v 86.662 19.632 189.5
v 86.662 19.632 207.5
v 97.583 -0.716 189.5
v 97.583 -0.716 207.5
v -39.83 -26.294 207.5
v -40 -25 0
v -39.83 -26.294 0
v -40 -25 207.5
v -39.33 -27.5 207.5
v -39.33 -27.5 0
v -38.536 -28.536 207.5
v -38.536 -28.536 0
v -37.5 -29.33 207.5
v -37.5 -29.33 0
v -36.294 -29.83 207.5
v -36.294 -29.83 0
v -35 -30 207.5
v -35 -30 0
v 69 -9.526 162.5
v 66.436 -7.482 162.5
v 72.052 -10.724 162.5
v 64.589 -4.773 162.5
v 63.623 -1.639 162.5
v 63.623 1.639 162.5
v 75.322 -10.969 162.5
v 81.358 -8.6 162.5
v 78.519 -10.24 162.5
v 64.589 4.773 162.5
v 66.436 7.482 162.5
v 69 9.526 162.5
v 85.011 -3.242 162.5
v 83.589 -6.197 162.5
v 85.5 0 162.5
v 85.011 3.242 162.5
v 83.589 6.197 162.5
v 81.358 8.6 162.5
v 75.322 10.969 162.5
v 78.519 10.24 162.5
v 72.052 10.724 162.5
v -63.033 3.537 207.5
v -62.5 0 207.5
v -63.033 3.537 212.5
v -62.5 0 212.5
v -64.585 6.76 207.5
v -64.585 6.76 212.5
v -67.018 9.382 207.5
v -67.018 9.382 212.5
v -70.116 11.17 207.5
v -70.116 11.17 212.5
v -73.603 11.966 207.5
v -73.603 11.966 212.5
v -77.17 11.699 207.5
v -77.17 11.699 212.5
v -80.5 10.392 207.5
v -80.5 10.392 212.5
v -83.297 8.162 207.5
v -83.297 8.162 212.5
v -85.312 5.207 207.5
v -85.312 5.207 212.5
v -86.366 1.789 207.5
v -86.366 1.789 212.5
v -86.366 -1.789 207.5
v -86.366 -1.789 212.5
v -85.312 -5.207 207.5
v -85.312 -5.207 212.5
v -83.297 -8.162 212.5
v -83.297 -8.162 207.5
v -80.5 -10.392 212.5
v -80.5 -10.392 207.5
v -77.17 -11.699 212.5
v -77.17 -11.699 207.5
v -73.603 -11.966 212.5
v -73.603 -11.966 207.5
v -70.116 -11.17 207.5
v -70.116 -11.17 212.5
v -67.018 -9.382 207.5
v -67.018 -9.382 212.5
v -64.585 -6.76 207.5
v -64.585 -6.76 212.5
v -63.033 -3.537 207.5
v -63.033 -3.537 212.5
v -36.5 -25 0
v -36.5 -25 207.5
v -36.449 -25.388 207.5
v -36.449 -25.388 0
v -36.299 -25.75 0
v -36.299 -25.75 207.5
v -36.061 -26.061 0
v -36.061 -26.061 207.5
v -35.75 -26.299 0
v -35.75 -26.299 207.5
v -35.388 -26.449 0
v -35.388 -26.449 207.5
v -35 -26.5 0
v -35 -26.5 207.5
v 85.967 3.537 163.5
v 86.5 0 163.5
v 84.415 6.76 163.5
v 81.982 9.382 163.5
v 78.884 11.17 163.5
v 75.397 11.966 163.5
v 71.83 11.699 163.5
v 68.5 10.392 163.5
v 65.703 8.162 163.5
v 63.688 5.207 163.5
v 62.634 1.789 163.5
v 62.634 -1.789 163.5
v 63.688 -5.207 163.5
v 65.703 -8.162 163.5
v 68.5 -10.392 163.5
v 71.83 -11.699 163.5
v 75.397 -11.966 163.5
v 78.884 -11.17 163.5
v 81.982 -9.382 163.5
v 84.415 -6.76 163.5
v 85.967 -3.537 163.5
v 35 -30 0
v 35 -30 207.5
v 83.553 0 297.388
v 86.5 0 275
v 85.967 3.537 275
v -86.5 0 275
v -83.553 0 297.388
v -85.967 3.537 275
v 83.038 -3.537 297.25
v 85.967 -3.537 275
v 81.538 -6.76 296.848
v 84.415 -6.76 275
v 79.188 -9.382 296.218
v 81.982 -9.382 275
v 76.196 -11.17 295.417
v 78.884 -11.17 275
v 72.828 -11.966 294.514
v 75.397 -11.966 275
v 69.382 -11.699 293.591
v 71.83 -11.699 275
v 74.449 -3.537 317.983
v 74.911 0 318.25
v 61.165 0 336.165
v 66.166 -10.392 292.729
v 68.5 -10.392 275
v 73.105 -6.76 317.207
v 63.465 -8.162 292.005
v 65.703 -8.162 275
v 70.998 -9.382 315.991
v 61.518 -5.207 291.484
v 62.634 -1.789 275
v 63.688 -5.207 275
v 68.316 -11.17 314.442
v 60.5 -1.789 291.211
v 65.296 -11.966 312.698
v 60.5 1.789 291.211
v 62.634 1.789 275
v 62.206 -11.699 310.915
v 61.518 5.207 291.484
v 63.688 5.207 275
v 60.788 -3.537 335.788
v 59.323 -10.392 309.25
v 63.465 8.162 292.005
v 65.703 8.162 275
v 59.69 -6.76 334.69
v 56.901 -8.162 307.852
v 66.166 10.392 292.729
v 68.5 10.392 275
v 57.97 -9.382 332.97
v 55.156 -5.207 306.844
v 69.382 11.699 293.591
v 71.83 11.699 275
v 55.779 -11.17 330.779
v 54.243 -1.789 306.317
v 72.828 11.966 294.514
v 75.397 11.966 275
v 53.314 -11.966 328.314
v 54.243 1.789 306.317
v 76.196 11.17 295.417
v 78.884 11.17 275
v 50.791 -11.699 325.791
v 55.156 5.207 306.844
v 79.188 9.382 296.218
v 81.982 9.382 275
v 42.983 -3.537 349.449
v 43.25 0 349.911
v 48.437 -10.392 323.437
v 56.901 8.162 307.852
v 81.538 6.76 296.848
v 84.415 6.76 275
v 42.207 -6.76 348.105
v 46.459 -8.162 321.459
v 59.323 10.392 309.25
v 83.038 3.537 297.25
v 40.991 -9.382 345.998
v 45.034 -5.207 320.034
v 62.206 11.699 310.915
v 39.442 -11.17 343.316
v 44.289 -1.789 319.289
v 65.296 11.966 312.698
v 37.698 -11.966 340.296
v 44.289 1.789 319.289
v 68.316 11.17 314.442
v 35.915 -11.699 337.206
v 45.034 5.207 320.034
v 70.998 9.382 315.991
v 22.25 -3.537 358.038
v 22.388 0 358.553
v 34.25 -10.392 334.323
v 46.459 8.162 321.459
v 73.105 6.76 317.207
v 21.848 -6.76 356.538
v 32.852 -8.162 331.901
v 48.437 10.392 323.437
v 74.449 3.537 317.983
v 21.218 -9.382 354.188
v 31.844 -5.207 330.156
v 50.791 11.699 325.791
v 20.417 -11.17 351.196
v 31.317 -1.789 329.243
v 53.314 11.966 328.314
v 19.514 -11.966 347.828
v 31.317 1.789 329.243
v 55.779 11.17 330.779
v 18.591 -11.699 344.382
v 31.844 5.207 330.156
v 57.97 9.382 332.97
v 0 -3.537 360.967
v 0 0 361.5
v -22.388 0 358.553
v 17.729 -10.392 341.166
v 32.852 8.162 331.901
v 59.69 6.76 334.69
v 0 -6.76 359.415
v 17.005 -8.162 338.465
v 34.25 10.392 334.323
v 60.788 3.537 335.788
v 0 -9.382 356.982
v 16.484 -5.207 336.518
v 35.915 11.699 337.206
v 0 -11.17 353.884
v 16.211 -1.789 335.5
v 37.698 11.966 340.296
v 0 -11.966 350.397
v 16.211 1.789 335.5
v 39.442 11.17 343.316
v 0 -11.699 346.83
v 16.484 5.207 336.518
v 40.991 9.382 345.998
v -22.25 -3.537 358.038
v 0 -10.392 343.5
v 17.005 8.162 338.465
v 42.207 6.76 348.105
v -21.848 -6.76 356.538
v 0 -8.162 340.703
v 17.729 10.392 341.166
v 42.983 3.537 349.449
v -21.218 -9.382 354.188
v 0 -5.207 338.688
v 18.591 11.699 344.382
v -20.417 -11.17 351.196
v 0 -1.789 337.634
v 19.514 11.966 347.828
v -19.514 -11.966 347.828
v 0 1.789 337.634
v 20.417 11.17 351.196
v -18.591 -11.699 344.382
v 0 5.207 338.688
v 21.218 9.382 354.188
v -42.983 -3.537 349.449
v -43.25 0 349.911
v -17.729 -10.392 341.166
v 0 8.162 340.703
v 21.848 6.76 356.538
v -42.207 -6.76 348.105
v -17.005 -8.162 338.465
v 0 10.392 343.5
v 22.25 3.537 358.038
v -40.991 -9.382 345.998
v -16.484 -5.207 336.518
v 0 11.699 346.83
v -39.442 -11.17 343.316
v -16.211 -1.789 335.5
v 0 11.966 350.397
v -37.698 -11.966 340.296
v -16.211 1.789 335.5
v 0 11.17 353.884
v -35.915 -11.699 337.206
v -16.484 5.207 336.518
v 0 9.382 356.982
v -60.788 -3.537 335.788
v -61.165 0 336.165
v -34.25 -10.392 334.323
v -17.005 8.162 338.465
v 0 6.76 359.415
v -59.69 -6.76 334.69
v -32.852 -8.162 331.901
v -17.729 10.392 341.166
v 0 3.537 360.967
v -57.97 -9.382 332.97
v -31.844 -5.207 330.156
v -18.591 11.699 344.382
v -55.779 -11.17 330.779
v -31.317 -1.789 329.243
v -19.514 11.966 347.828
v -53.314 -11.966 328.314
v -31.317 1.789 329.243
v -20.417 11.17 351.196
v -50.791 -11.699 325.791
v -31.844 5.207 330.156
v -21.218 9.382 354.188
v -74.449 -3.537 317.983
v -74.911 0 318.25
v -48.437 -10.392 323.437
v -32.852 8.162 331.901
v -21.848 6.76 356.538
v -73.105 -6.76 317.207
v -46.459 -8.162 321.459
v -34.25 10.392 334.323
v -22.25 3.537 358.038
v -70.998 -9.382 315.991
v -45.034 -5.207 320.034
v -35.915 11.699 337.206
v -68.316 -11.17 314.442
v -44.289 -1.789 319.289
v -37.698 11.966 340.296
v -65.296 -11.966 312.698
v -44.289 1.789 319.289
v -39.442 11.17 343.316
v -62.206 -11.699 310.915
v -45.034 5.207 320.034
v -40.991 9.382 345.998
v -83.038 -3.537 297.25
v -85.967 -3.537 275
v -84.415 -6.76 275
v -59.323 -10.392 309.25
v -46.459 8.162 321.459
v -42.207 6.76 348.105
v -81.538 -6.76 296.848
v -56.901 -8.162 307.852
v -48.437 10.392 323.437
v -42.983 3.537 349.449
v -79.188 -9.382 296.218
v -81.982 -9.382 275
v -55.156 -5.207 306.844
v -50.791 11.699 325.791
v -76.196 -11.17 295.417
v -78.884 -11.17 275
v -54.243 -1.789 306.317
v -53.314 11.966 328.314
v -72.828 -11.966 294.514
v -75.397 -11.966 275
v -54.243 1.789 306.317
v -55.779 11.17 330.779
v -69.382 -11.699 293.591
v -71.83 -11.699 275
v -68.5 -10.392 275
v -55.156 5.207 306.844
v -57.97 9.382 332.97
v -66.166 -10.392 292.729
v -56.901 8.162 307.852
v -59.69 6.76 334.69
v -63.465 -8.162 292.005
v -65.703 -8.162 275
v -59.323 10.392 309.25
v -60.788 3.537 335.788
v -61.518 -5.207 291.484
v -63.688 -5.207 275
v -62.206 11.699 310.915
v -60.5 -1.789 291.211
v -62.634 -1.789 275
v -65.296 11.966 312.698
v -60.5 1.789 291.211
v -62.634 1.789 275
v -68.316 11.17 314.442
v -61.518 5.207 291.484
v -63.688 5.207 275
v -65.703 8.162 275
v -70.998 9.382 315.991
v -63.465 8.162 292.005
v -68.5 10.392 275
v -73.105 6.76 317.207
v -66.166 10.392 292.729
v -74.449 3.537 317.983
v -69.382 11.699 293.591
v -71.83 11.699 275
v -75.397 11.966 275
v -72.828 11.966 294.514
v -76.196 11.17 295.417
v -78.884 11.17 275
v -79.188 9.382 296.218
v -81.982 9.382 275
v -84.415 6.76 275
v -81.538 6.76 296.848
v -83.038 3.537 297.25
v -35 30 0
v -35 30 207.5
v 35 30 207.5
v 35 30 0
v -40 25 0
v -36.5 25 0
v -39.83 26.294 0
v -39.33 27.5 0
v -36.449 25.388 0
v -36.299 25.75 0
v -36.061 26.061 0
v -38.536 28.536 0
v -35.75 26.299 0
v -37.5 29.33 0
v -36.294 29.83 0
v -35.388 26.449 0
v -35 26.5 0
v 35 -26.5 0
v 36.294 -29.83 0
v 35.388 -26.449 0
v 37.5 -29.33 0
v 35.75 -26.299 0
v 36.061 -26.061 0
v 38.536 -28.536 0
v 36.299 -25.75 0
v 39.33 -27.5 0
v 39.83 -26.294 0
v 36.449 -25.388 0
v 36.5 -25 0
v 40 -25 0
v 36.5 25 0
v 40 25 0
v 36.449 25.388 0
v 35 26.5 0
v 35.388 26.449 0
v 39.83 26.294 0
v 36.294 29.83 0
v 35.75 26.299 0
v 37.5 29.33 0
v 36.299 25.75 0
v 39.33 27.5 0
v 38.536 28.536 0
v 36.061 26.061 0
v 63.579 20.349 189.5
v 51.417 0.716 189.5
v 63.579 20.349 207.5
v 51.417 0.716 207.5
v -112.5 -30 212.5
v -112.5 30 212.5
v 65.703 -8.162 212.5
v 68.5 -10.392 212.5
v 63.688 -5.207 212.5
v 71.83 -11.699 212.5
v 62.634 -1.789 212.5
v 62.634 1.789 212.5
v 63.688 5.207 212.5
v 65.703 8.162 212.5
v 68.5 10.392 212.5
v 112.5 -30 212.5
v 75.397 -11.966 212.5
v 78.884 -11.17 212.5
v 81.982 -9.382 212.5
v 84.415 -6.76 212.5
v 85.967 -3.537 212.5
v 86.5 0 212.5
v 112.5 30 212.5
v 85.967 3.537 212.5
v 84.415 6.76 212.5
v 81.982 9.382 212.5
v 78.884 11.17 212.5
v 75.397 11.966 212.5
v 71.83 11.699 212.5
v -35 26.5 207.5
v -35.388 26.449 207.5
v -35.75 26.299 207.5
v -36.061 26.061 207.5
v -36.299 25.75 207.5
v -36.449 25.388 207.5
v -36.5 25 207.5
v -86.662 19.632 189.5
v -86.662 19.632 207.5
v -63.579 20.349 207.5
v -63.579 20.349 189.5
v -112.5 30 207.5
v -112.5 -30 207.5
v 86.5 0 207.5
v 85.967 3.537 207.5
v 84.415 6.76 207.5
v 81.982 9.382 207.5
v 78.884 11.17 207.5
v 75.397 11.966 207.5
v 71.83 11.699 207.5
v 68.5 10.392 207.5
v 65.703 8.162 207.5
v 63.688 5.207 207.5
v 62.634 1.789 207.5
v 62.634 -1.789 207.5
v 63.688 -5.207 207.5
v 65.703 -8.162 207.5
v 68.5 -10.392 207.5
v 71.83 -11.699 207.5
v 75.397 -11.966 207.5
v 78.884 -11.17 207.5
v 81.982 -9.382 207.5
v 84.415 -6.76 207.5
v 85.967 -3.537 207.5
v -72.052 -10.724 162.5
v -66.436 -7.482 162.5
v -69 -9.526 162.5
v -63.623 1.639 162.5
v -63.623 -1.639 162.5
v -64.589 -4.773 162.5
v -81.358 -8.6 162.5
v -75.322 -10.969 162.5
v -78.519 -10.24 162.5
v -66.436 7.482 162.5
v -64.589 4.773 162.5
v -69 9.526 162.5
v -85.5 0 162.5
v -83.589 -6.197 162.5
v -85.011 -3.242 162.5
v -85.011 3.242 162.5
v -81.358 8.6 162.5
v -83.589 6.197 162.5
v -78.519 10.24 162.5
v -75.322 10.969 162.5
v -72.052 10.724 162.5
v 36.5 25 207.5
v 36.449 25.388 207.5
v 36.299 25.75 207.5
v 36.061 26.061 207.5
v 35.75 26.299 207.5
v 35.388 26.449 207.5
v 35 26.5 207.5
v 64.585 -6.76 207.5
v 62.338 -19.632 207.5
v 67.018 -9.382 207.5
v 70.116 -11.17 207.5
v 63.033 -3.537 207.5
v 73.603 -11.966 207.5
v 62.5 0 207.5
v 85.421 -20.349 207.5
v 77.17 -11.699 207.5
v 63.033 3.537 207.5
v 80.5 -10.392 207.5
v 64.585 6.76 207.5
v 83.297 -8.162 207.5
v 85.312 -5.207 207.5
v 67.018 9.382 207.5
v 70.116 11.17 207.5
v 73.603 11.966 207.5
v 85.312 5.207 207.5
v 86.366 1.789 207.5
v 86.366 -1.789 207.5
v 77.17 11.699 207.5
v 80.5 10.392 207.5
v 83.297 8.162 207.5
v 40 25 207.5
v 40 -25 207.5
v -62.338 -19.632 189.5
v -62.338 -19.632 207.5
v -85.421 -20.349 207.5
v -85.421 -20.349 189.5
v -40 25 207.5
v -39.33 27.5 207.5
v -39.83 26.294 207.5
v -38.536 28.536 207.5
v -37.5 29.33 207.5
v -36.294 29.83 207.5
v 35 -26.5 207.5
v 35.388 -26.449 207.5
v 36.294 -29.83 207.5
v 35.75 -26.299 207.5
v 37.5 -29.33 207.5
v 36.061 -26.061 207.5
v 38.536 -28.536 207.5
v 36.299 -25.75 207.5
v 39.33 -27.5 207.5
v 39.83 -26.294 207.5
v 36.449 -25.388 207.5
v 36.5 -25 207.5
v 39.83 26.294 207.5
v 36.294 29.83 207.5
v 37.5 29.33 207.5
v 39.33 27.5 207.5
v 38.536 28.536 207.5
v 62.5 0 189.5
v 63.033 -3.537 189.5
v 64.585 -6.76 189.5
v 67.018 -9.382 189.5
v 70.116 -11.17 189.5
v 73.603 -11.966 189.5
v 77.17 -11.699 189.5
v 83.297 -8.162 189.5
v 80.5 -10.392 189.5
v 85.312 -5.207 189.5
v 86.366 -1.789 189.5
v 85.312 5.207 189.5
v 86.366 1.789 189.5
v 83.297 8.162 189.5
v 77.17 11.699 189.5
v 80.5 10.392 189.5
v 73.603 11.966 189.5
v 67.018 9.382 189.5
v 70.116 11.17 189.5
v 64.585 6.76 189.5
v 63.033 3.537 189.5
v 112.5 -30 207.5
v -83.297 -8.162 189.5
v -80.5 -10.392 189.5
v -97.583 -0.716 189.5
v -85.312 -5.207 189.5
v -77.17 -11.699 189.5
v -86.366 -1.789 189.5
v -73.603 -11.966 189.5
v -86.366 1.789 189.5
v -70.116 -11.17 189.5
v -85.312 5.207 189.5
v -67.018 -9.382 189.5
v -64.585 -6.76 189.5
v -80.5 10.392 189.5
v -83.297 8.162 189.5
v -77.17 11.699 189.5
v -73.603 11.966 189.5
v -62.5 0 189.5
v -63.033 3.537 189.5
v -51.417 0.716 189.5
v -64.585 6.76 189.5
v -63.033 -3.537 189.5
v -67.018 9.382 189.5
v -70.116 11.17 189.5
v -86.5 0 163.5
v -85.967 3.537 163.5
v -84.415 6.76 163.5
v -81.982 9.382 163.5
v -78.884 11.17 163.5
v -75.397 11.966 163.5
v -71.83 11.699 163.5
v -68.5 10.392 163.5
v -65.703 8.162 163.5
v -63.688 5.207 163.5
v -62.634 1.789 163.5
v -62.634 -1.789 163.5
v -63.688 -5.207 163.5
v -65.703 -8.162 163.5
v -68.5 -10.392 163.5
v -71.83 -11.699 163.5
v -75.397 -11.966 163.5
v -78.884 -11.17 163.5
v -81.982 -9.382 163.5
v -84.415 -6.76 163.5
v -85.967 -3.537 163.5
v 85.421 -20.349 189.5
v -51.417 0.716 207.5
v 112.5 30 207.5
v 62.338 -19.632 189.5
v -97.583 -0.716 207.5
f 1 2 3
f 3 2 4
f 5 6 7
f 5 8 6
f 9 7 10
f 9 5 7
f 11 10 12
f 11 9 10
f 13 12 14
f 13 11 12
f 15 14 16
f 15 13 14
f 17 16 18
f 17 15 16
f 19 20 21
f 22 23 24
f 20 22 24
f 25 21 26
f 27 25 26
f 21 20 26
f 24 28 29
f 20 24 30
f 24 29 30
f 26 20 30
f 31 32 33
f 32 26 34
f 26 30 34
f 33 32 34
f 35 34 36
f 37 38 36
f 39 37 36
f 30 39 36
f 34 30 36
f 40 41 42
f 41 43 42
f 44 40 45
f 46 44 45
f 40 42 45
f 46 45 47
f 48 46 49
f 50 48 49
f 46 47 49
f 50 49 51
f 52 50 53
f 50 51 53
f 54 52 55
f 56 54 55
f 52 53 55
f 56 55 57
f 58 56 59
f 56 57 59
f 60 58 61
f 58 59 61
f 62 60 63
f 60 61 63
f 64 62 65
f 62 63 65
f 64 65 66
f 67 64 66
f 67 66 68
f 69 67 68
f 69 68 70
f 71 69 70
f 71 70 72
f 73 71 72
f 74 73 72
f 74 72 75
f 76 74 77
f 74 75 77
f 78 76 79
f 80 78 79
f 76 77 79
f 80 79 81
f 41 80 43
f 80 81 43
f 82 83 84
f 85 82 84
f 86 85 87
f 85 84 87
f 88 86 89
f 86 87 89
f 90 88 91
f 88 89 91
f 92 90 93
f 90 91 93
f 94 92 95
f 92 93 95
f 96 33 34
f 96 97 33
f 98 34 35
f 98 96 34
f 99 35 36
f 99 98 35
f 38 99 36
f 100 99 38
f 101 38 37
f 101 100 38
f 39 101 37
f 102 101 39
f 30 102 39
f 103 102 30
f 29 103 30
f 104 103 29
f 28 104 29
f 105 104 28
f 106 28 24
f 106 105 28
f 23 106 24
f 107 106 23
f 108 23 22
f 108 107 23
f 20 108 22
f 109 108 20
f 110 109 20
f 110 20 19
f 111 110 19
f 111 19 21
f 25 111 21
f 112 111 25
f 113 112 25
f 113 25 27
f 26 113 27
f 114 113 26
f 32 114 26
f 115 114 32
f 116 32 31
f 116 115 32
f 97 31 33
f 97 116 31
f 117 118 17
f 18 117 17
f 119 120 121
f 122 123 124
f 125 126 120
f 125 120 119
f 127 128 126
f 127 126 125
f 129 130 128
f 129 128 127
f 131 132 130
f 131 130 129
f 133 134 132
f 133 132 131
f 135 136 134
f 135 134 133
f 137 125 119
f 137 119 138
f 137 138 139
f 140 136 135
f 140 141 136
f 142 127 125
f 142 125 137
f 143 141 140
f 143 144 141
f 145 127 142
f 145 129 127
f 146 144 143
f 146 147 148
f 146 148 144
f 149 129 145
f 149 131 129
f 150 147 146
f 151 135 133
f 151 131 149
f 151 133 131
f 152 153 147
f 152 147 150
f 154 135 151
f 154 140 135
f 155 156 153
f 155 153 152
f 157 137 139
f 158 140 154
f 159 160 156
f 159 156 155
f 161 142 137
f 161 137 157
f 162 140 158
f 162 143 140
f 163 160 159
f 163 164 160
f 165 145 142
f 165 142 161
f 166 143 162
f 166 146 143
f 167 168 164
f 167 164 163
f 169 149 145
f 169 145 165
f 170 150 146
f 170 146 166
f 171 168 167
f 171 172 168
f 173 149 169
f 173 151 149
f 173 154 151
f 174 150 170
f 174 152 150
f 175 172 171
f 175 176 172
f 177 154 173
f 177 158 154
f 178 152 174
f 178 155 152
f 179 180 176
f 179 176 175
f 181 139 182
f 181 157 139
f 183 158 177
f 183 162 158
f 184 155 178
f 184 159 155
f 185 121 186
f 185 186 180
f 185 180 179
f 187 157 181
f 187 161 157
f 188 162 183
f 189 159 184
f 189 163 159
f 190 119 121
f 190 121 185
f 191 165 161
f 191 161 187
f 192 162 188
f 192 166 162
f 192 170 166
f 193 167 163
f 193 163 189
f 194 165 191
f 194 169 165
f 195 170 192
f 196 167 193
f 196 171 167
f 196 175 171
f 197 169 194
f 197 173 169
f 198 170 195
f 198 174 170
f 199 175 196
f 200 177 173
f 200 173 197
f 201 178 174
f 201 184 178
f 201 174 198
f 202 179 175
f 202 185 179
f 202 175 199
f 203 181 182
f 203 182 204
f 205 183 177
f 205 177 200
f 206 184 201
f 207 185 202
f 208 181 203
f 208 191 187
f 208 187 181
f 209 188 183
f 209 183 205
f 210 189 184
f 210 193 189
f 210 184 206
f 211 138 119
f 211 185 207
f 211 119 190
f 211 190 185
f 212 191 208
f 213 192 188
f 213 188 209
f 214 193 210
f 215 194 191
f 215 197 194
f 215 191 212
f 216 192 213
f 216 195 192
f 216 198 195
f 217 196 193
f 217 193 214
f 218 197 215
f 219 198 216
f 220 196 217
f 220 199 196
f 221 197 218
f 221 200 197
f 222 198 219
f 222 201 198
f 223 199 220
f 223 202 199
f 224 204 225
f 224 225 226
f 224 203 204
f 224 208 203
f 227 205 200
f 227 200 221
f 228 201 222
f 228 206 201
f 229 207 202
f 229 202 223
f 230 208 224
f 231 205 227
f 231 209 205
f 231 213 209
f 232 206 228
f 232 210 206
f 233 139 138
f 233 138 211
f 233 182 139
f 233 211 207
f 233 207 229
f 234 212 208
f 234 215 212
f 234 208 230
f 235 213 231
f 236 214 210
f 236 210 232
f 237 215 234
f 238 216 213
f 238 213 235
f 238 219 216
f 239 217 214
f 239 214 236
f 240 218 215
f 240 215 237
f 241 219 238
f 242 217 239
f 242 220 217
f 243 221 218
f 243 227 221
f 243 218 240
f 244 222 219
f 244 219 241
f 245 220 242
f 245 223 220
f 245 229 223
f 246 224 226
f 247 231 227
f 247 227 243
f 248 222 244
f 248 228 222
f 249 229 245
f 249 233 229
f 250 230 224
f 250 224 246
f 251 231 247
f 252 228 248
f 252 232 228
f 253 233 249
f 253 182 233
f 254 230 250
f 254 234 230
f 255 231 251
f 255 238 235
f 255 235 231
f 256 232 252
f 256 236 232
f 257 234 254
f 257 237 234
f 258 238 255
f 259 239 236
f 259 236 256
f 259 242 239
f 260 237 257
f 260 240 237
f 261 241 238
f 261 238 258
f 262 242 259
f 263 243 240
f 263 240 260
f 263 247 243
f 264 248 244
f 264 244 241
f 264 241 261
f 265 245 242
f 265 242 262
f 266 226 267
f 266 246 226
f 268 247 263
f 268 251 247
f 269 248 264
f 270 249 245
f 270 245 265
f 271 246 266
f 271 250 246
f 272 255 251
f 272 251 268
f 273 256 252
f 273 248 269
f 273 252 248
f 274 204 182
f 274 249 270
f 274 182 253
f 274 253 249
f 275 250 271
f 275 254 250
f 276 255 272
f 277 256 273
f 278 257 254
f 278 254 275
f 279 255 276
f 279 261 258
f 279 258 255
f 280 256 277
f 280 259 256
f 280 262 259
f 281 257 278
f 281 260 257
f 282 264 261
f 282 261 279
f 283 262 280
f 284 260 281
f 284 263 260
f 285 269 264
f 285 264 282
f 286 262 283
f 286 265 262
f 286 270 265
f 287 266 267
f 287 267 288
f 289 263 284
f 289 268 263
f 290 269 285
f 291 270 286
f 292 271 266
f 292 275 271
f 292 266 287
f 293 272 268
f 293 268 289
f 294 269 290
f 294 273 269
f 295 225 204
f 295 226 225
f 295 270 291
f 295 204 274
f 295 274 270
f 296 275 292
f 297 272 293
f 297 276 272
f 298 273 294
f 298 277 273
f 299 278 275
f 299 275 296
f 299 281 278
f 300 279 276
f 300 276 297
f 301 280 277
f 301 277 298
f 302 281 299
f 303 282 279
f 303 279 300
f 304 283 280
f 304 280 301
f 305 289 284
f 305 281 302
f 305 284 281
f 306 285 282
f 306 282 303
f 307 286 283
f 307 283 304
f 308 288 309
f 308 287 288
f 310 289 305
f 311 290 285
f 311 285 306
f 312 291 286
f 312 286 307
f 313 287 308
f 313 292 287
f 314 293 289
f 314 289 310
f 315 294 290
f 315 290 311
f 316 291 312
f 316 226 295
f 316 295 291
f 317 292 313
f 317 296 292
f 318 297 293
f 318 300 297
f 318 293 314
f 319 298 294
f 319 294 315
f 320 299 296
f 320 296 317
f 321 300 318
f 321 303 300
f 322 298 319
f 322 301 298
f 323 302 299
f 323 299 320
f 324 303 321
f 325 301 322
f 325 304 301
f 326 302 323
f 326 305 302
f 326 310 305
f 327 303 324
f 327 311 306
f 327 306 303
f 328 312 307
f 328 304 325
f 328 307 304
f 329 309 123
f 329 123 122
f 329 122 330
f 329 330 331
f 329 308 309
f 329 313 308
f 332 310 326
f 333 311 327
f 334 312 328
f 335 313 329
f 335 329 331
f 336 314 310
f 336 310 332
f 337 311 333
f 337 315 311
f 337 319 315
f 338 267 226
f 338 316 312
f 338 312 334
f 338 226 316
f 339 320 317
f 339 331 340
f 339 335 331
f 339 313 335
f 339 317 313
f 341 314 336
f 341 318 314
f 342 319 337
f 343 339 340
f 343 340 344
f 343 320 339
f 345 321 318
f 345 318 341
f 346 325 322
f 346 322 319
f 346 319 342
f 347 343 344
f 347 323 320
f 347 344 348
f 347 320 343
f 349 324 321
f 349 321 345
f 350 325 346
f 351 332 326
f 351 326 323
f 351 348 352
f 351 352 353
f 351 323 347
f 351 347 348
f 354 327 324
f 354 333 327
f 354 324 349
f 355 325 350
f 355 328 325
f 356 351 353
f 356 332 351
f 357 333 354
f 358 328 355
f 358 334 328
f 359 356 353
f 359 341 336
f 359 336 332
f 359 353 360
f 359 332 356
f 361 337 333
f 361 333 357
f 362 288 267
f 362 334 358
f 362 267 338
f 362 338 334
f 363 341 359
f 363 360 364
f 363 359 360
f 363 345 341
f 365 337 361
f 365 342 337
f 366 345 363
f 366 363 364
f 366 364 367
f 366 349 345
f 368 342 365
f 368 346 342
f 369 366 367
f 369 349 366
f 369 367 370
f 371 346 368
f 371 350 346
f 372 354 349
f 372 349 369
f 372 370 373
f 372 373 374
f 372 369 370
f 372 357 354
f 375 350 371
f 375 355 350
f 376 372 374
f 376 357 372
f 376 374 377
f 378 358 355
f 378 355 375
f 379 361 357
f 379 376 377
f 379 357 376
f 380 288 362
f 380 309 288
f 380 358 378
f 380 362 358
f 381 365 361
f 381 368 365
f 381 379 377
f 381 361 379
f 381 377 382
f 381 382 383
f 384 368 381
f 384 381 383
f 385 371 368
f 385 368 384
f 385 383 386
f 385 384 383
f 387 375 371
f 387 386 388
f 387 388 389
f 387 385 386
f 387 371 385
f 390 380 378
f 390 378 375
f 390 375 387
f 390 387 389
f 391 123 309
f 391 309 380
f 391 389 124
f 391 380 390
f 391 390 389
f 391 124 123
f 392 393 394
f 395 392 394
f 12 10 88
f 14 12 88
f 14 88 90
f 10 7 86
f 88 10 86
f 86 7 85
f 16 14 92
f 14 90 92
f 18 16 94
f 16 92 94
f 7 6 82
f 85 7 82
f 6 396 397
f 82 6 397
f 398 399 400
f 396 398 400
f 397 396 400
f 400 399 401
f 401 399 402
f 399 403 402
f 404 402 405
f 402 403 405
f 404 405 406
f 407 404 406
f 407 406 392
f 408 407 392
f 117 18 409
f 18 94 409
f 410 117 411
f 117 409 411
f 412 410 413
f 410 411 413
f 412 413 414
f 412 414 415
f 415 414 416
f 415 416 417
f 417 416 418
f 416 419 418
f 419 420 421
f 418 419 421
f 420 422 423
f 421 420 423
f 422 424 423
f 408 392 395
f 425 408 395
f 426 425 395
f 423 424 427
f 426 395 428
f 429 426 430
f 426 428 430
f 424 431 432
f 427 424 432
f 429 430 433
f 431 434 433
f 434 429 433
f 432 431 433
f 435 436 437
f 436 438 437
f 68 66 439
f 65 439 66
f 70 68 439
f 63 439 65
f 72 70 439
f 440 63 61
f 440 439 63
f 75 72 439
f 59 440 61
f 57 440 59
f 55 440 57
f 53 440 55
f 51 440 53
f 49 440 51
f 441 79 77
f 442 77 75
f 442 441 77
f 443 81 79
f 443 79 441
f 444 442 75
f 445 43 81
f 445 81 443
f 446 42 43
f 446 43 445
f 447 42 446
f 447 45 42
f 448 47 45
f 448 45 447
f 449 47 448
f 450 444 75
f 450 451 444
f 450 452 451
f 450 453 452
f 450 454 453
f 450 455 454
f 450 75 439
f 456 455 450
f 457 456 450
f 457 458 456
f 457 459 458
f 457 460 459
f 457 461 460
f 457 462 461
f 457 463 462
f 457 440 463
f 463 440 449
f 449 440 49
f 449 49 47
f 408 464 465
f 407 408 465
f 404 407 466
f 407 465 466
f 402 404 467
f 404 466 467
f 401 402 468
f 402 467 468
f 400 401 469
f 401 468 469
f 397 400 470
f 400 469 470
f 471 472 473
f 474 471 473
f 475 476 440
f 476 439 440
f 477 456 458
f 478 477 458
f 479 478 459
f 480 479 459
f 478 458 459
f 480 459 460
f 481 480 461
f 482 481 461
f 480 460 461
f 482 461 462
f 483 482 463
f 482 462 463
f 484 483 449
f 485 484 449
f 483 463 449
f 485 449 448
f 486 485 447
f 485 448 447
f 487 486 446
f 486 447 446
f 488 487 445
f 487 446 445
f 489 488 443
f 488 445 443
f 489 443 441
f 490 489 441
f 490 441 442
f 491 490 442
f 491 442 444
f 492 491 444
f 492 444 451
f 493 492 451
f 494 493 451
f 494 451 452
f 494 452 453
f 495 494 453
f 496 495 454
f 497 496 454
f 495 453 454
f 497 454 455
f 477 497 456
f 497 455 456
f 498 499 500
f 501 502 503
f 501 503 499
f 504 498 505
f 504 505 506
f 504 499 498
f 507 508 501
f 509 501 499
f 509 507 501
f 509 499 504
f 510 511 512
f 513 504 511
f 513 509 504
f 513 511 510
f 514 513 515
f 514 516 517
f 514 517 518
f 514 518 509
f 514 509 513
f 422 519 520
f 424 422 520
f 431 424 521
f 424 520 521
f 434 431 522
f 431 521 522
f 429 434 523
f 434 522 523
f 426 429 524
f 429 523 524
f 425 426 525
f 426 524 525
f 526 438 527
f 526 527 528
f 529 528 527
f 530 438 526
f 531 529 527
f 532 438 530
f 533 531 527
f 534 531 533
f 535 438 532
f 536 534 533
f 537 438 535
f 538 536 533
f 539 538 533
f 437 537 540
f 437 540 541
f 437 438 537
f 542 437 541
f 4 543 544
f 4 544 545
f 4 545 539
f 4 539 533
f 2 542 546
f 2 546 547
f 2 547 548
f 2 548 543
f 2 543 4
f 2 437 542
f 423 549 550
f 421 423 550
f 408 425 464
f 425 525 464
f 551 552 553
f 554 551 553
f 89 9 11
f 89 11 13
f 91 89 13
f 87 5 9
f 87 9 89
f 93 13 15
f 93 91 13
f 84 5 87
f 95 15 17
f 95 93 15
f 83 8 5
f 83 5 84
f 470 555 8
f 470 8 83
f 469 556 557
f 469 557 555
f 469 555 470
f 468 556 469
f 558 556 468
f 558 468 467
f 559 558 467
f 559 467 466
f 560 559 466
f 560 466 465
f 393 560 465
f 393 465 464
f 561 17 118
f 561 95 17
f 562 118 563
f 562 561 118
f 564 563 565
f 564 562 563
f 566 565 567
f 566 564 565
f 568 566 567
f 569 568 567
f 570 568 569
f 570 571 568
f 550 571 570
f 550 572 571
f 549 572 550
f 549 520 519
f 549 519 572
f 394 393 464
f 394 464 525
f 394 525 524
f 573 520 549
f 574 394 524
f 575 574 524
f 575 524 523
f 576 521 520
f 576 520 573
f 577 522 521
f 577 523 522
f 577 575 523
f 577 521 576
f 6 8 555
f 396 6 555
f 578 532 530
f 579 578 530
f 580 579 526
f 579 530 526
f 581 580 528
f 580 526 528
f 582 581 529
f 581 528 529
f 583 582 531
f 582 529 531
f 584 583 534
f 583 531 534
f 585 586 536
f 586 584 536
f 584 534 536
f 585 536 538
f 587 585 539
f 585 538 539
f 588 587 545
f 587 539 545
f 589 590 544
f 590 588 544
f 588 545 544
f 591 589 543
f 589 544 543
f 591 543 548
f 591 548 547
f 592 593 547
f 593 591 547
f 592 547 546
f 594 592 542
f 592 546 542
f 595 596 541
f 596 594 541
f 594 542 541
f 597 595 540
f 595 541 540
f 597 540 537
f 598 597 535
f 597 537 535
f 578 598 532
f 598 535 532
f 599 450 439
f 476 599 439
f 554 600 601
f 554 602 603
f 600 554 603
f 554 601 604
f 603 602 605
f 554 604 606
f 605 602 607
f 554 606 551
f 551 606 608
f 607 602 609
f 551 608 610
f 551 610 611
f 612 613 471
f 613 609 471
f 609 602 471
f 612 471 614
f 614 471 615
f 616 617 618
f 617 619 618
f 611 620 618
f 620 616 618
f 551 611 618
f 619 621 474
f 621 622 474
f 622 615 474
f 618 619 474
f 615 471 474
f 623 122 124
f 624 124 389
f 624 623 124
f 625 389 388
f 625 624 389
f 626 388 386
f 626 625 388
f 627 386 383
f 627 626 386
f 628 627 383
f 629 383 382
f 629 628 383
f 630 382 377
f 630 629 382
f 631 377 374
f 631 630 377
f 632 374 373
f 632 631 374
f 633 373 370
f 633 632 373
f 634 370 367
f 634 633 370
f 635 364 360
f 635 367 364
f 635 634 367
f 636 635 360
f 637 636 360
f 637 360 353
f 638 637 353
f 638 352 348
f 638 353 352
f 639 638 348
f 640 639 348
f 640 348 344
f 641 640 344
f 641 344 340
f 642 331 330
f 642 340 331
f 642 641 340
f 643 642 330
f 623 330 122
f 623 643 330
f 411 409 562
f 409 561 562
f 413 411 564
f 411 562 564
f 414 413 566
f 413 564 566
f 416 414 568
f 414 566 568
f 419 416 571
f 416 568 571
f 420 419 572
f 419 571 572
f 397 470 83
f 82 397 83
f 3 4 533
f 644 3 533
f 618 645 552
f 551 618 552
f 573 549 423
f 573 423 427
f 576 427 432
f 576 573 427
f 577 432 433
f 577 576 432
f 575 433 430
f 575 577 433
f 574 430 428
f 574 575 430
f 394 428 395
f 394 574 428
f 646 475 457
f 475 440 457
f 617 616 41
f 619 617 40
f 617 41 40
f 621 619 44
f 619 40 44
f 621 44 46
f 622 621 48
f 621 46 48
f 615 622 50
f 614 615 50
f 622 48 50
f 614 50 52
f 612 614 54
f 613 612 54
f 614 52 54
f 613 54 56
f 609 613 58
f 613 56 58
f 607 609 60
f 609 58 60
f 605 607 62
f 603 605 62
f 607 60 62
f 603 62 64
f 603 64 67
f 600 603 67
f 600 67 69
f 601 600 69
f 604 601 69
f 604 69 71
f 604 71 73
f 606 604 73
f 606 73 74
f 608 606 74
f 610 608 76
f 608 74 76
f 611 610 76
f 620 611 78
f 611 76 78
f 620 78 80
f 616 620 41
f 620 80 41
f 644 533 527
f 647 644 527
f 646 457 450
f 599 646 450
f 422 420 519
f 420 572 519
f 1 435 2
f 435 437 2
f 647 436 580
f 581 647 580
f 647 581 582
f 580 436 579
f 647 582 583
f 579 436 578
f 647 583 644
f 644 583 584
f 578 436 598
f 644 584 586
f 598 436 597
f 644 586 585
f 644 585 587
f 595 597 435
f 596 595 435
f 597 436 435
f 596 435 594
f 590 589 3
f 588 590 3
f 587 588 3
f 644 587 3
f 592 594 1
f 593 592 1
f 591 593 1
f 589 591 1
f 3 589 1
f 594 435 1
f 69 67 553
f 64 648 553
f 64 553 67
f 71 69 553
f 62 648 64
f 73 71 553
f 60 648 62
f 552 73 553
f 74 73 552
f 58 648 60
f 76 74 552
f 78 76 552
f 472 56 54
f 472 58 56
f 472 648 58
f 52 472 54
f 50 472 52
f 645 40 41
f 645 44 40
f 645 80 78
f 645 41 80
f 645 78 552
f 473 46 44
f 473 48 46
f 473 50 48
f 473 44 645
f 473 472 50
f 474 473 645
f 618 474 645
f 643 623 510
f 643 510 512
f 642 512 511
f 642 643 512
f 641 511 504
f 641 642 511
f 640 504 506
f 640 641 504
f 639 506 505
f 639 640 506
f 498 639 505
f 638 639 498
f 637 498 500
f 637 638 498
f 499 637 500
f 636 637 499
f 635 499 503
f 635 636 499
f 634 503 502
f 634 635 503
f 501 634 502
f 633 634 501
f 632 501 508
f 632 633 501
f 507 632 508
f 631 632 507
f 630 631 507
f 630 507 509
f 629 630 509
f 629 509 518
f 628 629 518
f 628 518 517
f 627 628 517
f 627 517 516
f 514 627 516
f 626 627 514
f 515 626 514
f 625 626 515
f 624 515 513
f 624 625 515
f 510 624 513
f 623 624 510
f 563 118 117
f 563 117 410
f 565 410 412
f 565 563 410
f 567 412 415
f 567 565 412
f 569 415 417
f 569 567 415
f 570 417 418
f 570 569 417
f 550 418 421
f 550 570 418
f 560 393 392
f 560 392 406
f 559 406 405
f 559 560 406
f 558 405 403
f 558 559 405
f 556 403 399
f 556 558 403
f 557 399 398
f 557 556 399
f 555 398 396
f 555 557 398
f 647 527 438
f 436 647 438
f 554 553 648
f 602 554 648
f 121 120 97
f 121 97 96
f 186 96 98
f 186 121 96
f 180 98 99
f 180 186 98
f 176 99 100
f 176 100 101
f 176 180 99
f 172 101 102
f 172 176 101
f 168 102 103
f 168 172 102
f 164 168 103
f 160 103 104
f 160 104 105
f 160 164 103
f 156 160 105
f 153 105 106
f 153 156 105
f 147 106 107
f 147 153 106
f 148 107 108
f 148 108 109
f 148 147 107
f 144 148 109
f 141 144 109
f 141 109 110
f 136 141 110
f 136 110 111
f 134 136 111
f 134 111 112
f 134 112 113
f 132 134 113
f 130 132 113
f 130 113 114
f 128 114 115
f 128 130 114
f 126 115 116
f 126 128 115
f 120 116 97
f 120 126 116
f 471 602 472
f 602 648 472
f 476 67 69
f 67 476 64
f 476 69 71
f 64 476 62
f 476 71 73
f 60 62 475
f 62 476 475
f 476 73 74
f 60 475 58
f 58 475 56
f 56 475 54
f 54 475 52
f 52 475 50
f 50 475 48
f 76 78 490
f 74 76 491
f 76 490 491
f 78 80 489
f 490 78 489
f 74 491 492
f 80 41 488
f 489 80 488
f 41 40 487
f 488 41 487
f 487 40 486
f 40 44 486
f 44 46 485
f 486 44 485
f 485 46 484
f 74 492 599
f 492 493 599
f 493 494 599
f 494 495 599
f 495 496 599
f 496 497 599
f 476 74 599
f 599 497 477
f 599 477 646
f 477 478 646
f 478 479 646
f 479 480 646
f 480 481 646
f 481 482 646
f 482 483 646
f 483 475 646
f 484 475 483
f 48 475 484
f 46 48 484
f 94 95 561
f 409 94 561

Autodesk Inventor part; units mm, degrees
ref_plane "YZ Plane" through (0, 0, 0) normal (1, 0, 0) x (0, 1, 0)
sketch "Sketch1" plane through (0, 0, 0) normal (0, 1, 0) x (-1, 0, 0)
  arc A0 (-62.5, 275) -> (62.5, 275) centre (0, 275) ccw construction
  line L0 (62.5, 212.5) -> (-62.5, 212.5) construction
  line L1 (62.5, 275) -> (62.5, 162.5)
  line L2 (-62.5, 275) -> (-62.5, 162.5)
  arc A1 (62.5, 275) -> (-62.5, 275) centre (0, 275) ccw
  line L3 (62.5, 162.5) -> (-62.5, 162.5) construction
  point P0 (0, 0)
  dimension "Thread" = 50
  dimension "d13" = 275
ref_plane "Work Plane1" through (-62.5, 0, 162.5) normal (0, 0, -1) x (-1, 0, 0)
sketch "Sketch2" plane through (-62.5, 0, 162.5) normal (0, 0, -1) x (-1, 0, 0)
  circle A0 centre (12, 0) radius 12
  point P0 (-62.5, 0)
  point P1 (0, 0)
  dimension "d2" = 24
sweep "Sweep1" add profiles "Sketch2" path "Sketch1"
thread "Thread1"
thread "Thread2"
chamfer "Chamfer1" distance 1 angle 45 4 edges at (62.5, 0, 162.5) (62.5, 0, 275) (-62.5, 0, 275) (-62.5, 0, 162.5)
ref_plane "Work Plane3" through (-62.5, 0, 212.5) normal (0, 0, 1) x (1, 0, 0)
sketch "Sketch3" plane through (-62.5, 0, 212.5) normal (0, 0, 1) x (1, 0, 0)
  line L0 (175, -30) -> (-50, -30)
  line L1 (-50, -30) -> (-50, 30)
  line L2 (-50, 30) -> (175, 30)
  line L3 (175, 30) -> (175, -30)
  line L4 (175, -30) -> (-50, 30) construction
  line L5 (-50, -30) -> (175, 30) construction
  circle A0 centre (-12, 0) radius 12 projected
  circle A1 centre (137, 0) radius 12 projected
  line L6 (97.5, -30) -> (27.5, -30)
  line L7 (22.5, -25) -> (22.5, 25)
  line L8 (27.5, 30) -> (97.5, 30)
  line L9 (102.5, 25) -> (102.5, -25)
  line L10 (102.5, -30) -> (22.5, 30) construction
  line L11 (22.5, -30) -> (102.5, 30) construction
  arc A2 (22.5, -25) -> (27.5, -30) centre (27.5, -25) ccw
  arc A3 (27.5, 30) -> (22.5, 25) centre (27.5, 25) ccw
  arc A4 (102.5, 25) -> (97.5, 30) centre (97.5, 25) ccw
  arc A5 (97.5, -30) -> (102.5, -25) centre (97.5, -25) ccw
  line L12 (26, 25) -> (26, -25)
  arc A6 (26, -25) -> (27.5, -26.5) centre (27.5, -25) ccw
  line L13 (27.5, -26.5) -> (97.5, -26.5)
  arc A7 (97.5, -26.5) -> (99, -25) centre (97.5, -25) ccw
  line L14 (99, -25) -> (99, 25)
  arc A8 (99, 25) -> (97.5, 26.5) centre (97.5, 25) ccw
  line L15 (97.5, 26.5) -> (27.5, 26.5)
  arc A9 (27.5, 26.5) -> (26, 25) centre (27.5, 25) ccw
  line L16 (0.1619, -19.6321) -> (-22.921, -20.3486)
  line L17 (-22.921, -20.3486) -> (-35.0829, -0.7165)
  line L18 (-35.0829, -0.7165) -> (-24.1619, 19.6321)
  line L19 (-24.1619, 19.6321) -> (-1.079, 20.3486)
  line L20 (-1.079, 20.3486) -> (11.0829, 0.7165)
  line L21 (11.0829, 0.7165) -> (0.1619, -19.6321)
  point P0 (62.5, 0)
  point P1 (-12, 0)
  dimension "d15" = 225
  dimension "d16" = 60
  dimension "d21" = 80
  dimension "d22" = 60
  dimension "d23" = 5
  dimension "d24" = 3.5
  dimension "d27" = 40
extrude "Extrusion1" add sketch "Sketch3" against normal blind 5 separate body contours L0 A5 L9 A4 L2 L3 | L0 A2 L7 A3 L2 A4 L9 A5 | L0 L1 L2 A3 L7 A2 | A0 | A1 | A9 L15 A8 L14 A7 L13 A6 L12 | L16 L17 L18 L19 L20 L21
extrude "Extrusion2" cut sketch "Sketch3" against normal through all contours A0 | A1 bodies 2
extrude "Extrusion3" add sketch "Sketch3" against normal up to surface (207.5 mm away) from surface at -5 separate body contours L0 A2 L7 A3 L2 A4 L9 A5
extrude "Extrusion4" add sketch "Sketch3" against normal blind 18 from surface at -5 separate body contours L16 L17 L18 L19 L20 L21
mirror "Mirror1" about plane through (0, 0, 0) normal (1, 0, 0) bodies 4
equation "\"d4\" = Thread"
equation "\"d6\" = Thread"
properties part number "Pipe Support U-Ring DN125" material "Stainless Steel"
